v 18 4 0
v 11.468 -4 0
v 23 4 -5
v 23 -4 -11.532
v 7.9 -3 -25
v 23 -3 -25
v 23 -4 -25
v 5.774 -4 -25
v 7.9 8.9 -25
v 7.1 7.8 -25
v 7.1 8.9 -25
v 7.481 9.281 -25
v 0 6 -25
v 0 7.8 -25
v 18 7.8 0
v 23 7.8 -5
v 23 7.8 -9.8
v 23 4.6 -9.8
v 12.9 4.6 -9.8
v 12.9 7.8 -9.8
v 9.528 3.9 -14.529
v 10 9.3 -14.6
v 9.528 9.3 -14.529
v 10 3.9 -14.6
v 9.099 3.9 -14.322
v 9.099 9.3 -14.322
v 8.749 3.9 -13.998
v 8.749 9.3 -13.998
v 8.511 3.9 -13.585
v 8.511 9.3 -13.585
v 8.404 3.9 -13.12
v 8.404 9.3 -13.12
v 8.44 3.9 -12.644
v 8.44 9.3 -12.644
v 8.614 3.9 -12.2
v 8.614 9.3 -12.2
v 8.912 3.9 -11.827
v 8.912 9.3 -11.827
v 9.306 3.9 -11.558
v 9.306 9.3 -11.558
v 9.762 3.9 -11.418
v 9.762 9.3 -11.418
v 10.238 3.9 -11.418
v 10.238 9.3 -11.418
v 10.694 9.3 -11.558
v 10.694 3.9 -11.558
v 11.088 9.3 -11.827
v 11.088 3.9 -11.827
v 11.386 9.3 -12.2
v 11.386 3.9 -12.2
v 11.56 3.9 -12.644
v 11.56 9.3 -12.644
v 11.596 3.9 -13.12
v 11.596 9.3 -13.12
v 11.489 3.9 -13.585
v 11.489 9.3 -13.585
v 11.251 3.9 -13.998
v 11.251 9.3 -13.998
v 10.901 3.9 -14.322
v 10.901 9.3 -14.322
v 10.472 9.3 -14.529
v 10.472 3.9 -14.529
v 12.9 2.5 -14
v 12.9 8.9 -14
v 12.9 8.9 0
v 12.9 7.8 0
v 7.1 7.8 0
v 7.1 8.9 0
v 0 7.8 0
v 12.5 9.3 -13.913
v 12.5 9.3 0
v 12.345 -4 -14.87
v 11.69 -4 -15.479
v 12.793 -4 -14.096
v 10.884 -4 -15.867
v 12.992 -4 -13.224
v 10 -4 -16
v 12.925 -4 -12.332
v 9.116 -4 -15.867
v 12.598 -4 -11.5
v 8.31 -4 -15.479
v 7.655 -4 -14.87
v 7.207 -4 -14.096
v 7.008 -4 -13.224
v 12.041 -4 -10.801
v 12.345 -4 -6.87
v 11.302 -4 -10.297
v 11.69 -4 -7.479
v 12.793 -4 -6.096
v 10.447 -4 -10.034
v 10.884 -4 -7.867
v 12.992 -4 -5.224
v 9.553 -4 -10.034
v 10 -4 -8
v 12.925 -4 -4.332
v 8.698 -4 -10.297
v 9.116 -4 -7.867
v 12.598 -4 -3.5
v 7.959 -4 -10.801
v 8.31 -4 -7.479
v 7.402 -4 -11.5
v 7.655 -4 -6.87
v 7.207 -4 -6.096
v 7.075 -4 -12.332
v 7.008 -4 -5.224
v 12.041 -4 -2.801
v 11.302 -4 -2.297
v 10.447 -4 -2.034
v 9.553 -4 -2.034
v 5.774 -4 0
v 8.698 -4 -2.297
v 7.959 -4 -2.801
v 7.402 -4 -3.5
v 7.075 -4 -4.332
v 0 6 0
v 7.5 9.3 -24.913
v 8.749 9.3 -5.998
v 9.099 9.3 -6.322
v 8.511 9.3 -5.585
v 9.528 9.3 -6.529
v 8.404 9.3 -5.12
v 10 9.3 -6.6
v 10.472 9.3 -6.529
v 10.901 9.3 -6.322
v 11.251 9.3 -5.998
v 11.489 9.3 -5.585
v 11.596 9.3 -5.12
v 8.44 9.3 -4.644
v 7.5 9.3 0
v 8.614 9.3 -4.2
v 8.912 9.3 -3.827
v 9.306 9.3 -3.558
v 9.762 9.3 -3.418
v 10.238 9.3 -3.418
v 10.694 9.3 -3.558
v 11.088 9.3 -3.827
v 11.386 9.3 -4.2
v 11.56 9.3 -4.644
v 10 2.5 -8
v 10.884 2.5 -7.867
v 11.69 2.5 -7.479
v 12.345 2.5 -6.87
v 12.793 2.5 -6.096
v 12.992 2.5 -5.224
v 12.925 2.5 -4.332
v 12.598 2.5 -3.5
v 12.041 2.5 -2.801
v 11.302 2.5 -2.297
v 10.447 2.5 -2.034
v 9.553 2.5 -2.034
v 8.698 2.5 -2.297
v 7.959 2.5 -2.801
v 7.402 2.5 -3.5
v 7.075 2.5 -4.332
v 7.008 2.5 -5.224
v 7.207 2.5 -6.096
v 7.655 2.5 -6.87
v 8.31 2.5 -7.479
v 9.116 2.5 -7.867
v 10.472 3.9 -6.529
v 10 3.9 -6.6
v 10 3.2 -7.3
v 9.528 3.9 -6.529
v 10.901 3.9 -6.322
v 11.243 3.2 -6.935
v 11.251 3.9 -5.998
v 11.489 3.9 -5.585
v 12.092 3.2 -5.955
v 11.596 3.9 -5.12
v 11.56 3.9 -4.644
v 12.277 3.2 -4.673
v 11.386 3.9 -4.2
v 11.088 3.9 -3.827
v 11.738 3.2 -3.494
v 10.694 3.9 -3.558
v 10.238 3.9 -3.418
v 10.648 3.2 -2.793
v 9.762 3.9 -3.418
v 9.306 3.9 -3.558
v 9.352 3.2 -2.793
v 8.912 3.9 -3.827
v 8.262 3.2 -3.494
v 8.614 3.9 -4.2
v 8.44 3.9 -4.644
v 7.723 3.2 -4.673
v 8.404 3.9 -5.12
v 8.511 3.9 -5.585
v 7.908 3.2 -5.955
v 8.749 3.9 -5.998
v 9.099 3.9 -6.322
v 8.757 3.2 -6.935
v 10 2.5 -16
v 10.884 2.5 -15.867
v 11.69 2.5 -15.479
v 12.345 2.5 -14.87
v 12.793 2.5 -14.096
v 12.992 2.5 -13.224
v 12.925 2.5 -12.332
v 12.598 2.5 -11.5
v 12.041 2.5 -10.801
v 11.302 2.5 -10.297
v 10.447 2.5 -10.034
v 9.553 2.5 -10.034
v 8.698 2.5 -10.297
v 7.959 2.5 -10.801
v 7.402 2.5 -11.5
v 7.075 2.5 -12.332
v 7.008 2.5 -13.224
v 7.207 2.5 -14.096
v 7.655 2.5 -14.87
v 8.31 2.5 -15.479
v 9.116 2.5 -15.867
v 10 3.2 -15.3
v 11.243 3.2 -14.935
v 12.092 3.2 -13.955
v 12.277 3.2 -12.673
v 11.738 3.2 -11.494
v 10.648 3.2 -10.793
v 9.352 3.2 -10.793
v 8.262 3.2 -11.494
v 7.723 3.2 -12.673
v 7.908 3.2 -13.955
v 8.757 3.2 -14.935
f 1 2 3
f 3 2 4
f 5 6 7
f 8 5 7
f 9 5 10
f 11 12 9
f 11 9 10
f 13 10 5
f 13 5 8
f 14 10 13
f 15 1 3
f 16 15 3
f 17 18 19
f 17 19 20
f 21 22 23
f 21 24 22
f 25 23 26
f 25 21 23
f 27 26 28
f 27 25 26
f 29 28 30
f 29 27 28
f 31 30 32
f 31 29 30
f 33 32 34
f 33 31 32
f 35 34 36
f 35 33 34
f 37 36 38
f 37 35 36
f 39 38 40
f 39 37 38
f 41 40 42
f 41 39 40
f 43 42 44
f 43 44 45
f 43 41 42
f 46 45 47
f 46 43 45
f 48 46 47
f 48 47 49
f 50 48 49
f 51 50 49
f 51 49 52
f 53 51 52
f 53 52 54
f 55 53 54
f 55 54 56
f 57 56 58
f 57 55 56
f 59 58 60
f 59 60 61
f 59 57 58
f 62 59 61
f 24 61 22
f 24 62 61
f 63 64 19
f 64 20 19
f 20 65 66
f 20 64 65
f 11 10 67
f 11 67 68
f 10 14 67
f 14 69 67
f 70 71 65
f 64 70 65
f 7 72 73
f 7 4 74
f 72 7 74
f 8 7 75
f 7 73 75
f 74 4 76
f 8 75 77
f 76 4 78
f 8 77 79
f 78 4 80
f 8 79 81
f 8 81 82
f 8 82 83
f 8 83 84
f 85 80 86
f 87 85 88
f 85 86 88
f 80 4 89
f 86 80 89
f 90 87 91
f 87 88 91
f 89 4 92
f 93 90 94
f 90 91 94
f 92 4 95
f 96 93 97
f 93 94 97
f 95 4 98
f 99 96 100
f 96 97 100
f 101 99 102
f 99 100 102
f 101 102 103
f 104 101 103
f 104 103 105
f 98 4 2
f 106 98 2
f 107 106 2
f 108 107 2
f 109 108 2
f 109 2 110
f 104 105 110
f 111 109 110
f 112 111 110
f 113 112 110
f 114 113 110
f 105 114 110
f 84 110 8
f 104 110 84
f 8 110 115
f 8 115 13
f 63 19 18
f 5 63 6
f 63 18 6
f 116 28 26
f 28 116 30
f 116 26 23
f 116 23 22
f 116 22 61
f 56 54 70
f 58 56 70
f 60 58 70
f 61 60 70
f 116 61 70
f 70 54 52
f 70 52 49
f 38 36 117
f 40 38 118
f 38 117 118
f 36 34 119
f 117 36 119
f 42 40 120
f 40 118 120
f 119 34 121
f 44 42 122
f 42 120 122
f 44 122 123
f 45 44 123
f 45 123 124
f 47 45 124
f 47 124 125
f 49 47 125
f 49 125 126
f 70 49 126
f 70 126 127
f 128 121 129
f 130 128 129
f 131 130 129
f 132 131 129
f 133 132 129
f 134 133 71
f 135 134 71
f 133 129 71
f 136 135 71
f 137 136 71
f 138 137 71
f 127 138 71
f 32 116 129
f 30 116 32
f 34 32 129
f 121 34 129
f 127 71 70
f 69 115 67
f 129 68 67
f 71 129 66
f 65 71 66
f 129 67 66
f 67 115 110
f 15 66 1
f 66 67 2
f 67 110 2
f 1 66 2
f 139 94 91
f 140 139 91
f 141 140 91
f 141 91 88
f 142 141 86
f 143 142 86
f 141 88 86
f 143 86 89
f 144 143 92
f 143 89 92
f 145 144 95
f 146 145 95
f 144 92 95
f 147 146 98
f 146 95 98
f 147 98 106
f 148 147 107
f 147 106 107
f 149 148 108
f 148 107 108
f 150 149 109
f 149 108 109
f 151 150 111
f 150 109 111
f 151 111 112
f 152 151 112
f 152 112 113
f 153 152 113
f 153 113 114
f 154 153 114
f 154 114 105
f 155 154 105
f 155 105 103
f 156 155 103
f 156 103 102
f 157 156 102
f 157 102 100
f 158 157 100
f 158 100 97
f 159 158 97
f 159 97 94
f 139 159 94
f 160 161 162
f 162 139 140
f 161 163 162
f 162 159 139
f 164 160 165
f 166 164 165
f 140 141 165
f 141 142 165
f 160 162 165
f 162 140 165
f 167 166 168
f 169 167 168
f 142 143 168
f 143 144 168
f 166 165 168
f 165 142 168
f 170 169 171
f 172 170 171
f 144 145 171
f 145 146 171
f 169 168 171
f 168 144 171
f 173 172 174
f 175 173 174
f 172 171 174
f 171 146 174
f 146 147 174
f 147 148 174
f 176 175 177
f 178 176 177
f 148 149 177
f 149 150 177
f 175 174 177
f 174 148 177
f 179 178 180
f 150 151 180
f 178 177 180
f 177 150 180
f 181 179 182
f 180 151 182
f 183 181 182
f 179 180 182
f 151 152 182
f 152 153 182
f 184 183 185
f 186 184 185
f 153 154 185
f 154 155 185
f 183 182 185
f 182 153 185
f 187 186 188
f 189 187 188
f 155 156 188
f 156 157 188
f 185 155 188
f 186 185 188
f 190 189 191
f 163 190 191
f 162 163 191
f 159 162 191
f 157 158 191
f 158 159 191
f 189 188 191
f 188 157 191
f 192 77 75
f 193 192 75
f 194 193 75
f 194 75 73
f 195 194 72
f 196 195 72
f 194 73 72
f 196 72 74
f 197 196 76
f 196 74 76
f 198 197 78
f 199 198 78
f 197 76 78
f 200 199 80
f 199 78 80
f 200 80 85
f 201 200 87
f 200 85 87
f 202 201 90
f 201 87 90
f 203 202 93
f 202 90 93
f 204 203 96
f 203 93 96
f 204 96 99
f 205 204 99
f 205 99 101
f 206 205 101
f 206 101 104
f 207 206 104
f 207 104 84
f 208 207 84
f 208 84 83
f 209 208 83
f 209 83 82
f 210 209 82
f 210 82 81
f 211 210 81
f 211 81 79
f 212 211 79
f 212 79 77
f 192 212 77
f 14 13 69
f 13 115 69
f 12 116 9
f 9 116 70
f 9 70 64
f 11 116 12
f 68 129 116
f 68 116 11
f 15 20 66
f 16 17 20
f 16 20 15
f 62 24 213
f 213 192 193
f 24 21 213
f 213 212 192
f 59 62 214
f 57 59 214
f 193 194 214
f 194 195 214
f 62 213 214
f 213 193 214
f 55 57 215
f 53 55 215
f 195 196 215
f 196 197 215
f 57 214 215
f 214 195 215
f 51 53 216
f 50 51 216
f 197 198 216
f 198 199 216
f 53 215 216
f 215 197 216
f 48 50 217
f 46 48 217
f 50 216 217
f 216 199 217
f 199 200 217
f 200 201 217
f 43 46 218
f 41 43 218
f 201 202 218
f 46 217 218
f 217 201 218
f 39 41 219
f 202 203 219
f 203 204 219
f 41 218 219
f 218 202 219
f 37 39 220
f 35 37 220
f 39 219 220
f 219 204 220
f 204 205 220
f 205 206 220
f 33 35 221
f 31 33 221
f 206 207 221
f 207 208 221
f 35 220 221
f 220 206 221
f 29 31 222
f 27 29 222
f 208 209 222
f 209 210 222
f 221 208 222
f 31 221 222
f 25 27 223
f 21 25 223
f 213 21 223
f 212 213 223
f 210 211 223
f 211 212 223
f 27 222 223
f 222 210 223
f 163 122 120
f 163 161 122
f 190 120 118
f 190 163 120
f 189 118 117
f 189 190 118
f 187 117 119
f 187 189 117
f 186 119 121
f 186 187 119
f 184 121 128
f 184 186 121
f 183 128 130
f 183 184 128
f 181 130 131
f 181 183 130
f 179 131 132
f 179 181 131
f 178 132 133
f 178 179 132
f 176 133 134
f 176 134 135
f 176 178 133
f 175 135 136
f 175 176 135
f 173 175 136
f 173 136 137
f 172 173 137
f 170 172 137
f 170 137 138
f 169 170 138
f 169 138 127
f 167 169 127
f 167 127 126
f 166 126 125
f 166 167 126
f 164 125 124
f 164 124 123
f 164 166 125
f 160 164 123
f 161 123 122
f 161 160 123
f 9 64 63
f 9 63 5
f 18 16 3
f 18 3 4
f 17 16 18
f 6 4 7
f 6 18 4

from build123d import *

# Parameters (mm, degrees)
SKETCH_1_W           = 20
SKETCH_1_H           = 20
EXTRUDE_1_DEPTH      = 4
SKETCH_2_W           = 12.9
SKETCH_2_H           = 20
EXTRUDE_2_DEPTH      = 3.8
SKETCH_3_R           = 1.6
CUT_EXTRUDE_1_DEPTH  = 30.340074983
SKETCH_4_W           = 5.8
SKETCH_4_H           = 20
SKETCH_4_R           = 1.6
EXTRUDE_3_DEPTH      = 1.5
SKETCH_5_R           = 3
CUT_EXTRUDE_3_DEPTH  = 2.4
SKETCH_6_W           = 20
SKETCH_6_H           = 4
EXTRUDE_4_DEPTH      = 3
EXTRUDE_START        = 4
SKETCH_7_W           = 23
SKETCH_7_H           = 20
SKETCH_7_R           = 3
EXTRUDE_5_DEPTH      = 4
SKETCH_9_W           = 10.1
SKETCH_9_H           = 20
EXTRUDE_6_DEPTH      = 2
EXTRUDE_7_DEPTH      = 5
CHAMFER_7_SIZE       = 10
CHAMFER_7_SIZE2      = 5.773502692
CHAMFER_8_SIZE       = 5
CHAMFER_9_SIZE       = 8
CHAMFER_9_SIZE2      = 4.618802154
CUT_EXTRUDE_9_DEPTH  = 10.1
CUT_EXTRUDE_10_REACH = 38.481
CHAMFER_10_SIZE      = 1.5
CHAMFER_11_SIZE      = 0.4
EXTRUDE_8_DEPTH      = 1.8
EXTRUDE_10_DEPTH     = 10.1


with BuildPart() as part:
    # 草图1 → 凸台-拉伸1 (new body)
    with BuildSketch(Plane(origin=(0, 0, 0), x_dir=(1, 0, 0), z_dir=(0, 1, 0))):
        with Locations((10, 10)):
            Rectangle(SKETCH_1_W, SKETCH_1_H)
    extrude(amount=EXTRUDE_1_DEPTH)

    # 草图2 → 凸台-拉伸2 (add)
    with BuildSketch(Plane(origin=(0, 4, 0), x_dir=(1, 0, 0), z_dir=(0, 1, 0))):
        with Locations((6.45, 10)):
            Rectangle(SKETCH_2_W, SKETCH_2_H)
    extrude(amount=EXTRUDE_2_DEPTH)

    # 草图3 → 切除-拉伸1 (cut, through all)
    with BuildSketch(Plane(origin=(0, 0, 0), x_dir=(-1, 0, 0), z_dir=(0, -1, 0))):
        with Locations(Location((-10, 5, 0), (0, 0, 90))):
            Circle(SKETCH_3_R)
        with Locations(Location((-10, 13, 0), (0, 0, 90))):
            Circle(SKETCH_3_R)
    extrude(amount=-CUT_EXTRUDE_1_DEPTH, mode=Mode.SUBTRACT)

    # 草图4 → 凸台-拉伸3 (add)
    with BuildSketch(Plane(origin=(0, 7.8, 0), x_dir=(1, 0, 0), z_dir=(0, 1, 0))):
        with Locations((10, 10)):
            Rectangle(SKETCH_4_W, SKETCH_4_H)
        with Locations(Location((10, 13, 0), (0, 0, 90))):
            Circle(SKETCH_4_R, mode=Mode.SUBTRACT)
        with Locations(Location((10, 5, 0), (0, 0, 90))):
            Circle(SKETCH_4_R, mode=Mode.SUBTRACT)
    extrude(amount=EXTRUDE_3_DEPTH)

    # 草图5 → 切除-拉伸3 (cut)
    with BuildSketch(Plane(origin=(0, 0, 0), x_dir=(-1, 0, 0), z_dir=(0, -1, 0))):
        with Locations(Location((-10, 5, 0), (0, 0, 90))):
            Circle(SKETCH_5_R)
        with Locations(Location((-10, 13, 0), (0, 0, 90))):
            Circle(SKETCH_5_R)
    extrude(amount=-CUT_EXTRUDE_3_DEPTH, mode=Mode.SUBTRACT)

    # 草图6 → 凸台-拉伸4 (add)
    with BuildSketch(Plane(origin=(20, 0, 0), x_dir=(0, 0, -1), z_dir=(1, 0, 0))):
        with Locations((10, 2)):
            Rectangle(SKETCH_6_W, SKETCH_6_H)
    extrude(amount=EXTRUDE_4_DEPTH)

    # 草图7 → 凸台-拉伸5 (add)
    with BuildSketch(Plane(origin=(0, 0, 0), x_dir=(-1, 0, 0), z_dir=(0, -1, 0)).offset(EXTRUDE_START)):
        with Locations((-11.5, 10)):
            Rectangle(SKETCH_7_W, SKETCH_7_H)
        with Locations(Location((-10, 13, 0), (0, 0, 90))):
            Circle(SKETCH_7_R, mode=Mode.SUBTRACT)
        with Locations(Location((-10, 5, 0), (0, 0, 90))):
            Circle(SKETCH_7_R, mode=Mode.SUBTRACT)
    extrude(amount=-EXTRUDE_5_DEPTH)

    # 草图9 → 凸台-拉伸6 (add)
    with BuildSketch(Plane(origin=(0, 4, 0), x_dir=(1, 0, 0), z_dir=(0, 1, 0))):
        with Locations((17.95, 10)):
            Rectangle(SKETCH_9_W, SKETCH_9_H)
    extrude(amount=EXTRUDE_6_DEPTH)

    # 草图11 → 凸台-拉伸7 (add)
    with BuildSketch(Plane(origin=(0, 0, -20), x_dir=(-1, 0, 0), z_dir=(0, 0, -1))):
        Polygon((-23, 6), (-23, -4), (0, -4), (0, 7.8), (-7.1, 7.8), (-7.1, 9.3), (-12.9, 9.3), (-12.9, 6), align=None)
    extrude(amount=EXTRUDE_7_DEPTH)

    # 倒角7
    chamfer_7_edges = [part.edges().sort_by_distance(p)[0] for p in [
        (0, -4, -12.5),
    ]]
    chamfer_7_side = [part.faces().sort_by_distance(p)[0] for p in [
        (0, 1.9, -12.5),
    ]]
    chamfer(chamfer_7_edges, length=CHAMFER_7_SIZE, length2=CHAMFER_7_SIZE2, reference=chamfer_7_side[0])

    # 倒角8
    chamfer_8_edges = [part.edges().sort_by_distance(p)[0] for p in [
        (23, 1, 0),
    ]]
    chamfer(chamfer_8_edges, length=CHAMFER_8_SIZE)

    # 倒角9
    chamfer_9_edges = [part.edges().sort_by_distance(p)[0] for p in [
        (20.5, -4, -2.5),
    ]]
    chamfer_9_side = [part.faces().sort_by_distance(p)[0] for p in [
        (20.5, 1, -2.5),
    ]]
    chamfer(chamfer_9_edges, length=CHAMFER_9_SIZE, length2=CHAMFER_9_SIZE2, reference=chamfer_9_side[0])

    # 草图15 → 切除-拉伸9 (cut)
    with BuildSketch(Plane(origin=(23, 0, 0), x_dir=(0, 0, -1), z_dir=(1, 0, 0))):
        Polygon((25, -3), (25, 6), (7, 6), align=None)
    extrude(amount=-CUT_EXTRUDE_9_DEPTH, mode=Mode.SUBTRACT)

    # 切除-拉伸10: up to this plane
    cut_extrude_10_end = Plane(origin=(-7.224611797, 6, -7), z_dir=(0, -0.894427190999916, 0.447213595499958))
    # 草图16 → 切除-拉伸10 (cut, up to the surface)
    with BuildSketch(Plane(origin=(0, 9.3, 0), x_dir=(1, 0, 0), z_dir=(0, 1, 0)), mode=Mode.PRIVATE) as cut_extrude_10_sk1:
        Polygon((7.9, 25), (12.9, 25), (12.9, 14), align=None)
    cut_extrude_10_tool1 = split(extrude(cut_extrude_10_sk1.sketch, amount=-CUT_EXTRUDE_10_REACH, mode=Mode.PRIVATE), bisect_by=cut_extrude_10_end, keep=Keep.BOTH, mode=Mode.PRIVATE)
    add(cut_extrude_10_tool1.solids().sort_by_distance((11.233333, 9.3, -21.333333))[0], mode=Mode.SUBTRACT)

    # 倒角10
    # the kernel refuses this chamfer: 1.5 mm, written as the material it takes off along each edge
    with BuildSketch(Plane(origin=(10, 2.4, -13), x_dir=(0, 0, -1), z_dir=(-1, 0, 0))) as chamfer_10_piece_1_section:
        Polygon((1.6, -CHAMFER_10_SIZE), (1.6 + CHAMFER_10_SIZE, 0), (1.6, 0), align=None)
    chamfer_10_piece_1 = revolve(axis=Axis((10, 2.4, -13), (0, -1, 0)), mode=Mode.PRIVATE)
    chamfer_10_piece_1 = chamfer_10_piece_1 & Plane(origin=(10, 3.20338318, -13), x_dir=(0, 0, -1), z_dir=(0, -1, 0)) * Cylinder(3, 13, mode=Mode.PRIVATE)
    add(chamfer_10_piece_1, mode=Mode.SUBTRACT)
    with BuildSketch(Plane(origin=(10, 2.4, -5), x_dir=(0, 0, -1), z_dir=(-1, 0, 0))) as chamfer_10_piece_2_section:
        Polygon((1.6, -CHAMFER_10_SIZE), (1.6 + CHAMFER_10_SIZE, 0), (1.6, 0), align=None)
    chamfer_10_piece_2 = revolve(axis=Axis((10, 2.4, -5), (0, -1, 0)), mode=Mode.PRIVATE)
    chamfer_10_piece_2 = chamfer_10_piece_2 & Plane(origin=(10, 3.20338318, -5), x_dir=(0, 0, -1), z_dir=(0, -1, 0)) * Cylinder(3, 13, mode=Mode.PRIVATE)
    add(chamfer_10_piece_2, mode=Mode.SUBTRACT)

    # 倒角11
    # the kernel refuses this chamfer: 0.4 mm, written as the material it takes off along each edge
    with BuildSketch(Plane(origin=(13.325667997, 9.3, -13.063530407), x_dir=(-0.9100222832929536, 0.027495876610587288, 0.4136464924058883), z_dir=(-0.4138029443011842, 0, -0.9103664774626047))) as chamfer_11_piece_1:
        Polygon((CHAMFER_11_SIZE * 0.999621916911, -CHAMFER_11_SIZE * 0.0274958766106), (-CHAMFER_11_SIZE * 0.0274958766106, -CHAMFER_11_SIZE * 0.999621916911), (0, 0), align=None)
    extrude(amount=14.140392364, mode=Mode.SUBTRACT)
    with BuildSketch(Plane(origin=(12.9, 9.3, 1.028673195), x_dir=(-0.9996219169112966, 0.027495876610587302, 0), z_dir=(0, 0, -1))) as chamfer_11_piece_2:
        Polygon((CHAMFER_11_SIZE * 0.999621916911, -CHAMFER_11_SIZE * 0.0274958766106), (-CHAMFER_11_SIZE * 0.0274958766106, -CHAMFER_11_SIZE * 0.999621916911), (0, 0), align=None)
    extrude(amount=16.05734639, mode=Mode.SUBTRACT)
    with BuildSketch(Plane(origin=(7.1, 9.3, 1.028673195), x_dir=(0.9996219169112966, 0.027495876610587302, 0), z_dir=(0, 0, -1))) as chamfer_11_piece_3:
        Polygon((CHAMFER_11_SIZE * 0.999621916911, CHAMFER_11_SIZE * 0.0274958766106), (-CHAMFER_11_SIZE * 0.0274958766106, CHAMFER_11_SIZE * 0.999621916911), (0, 0), align=None)
    extrude(amount=27.05734639, mode=Mode.SUBTRACT)

    # 草图17 → 凸台-拉伸8 (add)
    with BuildSketch(Plane(origin=(0, 6, 0), x_dir=(1, 0, 0), z_dir=(0, 1, 0))):
        Polygon((23, 5), (23, 7), (12.9, 7), (12.9, 0), (18, 0), align=None)
    extrude(amount=EXTRUDE_8_DEPTH)

    # 草图19 → 凸台-拉伸10 (add)
    with BuildSketch(Plane(origin=(23, 0, 0), x_dir=(0, 0, -1), z_dir=(1, 0, 0))):
        Polygon((9.8, 7.8), (7, 7.8), (7, 6), (9.8, 4.6), align=None)
    extrude(amount=-EXTRUDE_10_DEPTH)


solid = part.part
